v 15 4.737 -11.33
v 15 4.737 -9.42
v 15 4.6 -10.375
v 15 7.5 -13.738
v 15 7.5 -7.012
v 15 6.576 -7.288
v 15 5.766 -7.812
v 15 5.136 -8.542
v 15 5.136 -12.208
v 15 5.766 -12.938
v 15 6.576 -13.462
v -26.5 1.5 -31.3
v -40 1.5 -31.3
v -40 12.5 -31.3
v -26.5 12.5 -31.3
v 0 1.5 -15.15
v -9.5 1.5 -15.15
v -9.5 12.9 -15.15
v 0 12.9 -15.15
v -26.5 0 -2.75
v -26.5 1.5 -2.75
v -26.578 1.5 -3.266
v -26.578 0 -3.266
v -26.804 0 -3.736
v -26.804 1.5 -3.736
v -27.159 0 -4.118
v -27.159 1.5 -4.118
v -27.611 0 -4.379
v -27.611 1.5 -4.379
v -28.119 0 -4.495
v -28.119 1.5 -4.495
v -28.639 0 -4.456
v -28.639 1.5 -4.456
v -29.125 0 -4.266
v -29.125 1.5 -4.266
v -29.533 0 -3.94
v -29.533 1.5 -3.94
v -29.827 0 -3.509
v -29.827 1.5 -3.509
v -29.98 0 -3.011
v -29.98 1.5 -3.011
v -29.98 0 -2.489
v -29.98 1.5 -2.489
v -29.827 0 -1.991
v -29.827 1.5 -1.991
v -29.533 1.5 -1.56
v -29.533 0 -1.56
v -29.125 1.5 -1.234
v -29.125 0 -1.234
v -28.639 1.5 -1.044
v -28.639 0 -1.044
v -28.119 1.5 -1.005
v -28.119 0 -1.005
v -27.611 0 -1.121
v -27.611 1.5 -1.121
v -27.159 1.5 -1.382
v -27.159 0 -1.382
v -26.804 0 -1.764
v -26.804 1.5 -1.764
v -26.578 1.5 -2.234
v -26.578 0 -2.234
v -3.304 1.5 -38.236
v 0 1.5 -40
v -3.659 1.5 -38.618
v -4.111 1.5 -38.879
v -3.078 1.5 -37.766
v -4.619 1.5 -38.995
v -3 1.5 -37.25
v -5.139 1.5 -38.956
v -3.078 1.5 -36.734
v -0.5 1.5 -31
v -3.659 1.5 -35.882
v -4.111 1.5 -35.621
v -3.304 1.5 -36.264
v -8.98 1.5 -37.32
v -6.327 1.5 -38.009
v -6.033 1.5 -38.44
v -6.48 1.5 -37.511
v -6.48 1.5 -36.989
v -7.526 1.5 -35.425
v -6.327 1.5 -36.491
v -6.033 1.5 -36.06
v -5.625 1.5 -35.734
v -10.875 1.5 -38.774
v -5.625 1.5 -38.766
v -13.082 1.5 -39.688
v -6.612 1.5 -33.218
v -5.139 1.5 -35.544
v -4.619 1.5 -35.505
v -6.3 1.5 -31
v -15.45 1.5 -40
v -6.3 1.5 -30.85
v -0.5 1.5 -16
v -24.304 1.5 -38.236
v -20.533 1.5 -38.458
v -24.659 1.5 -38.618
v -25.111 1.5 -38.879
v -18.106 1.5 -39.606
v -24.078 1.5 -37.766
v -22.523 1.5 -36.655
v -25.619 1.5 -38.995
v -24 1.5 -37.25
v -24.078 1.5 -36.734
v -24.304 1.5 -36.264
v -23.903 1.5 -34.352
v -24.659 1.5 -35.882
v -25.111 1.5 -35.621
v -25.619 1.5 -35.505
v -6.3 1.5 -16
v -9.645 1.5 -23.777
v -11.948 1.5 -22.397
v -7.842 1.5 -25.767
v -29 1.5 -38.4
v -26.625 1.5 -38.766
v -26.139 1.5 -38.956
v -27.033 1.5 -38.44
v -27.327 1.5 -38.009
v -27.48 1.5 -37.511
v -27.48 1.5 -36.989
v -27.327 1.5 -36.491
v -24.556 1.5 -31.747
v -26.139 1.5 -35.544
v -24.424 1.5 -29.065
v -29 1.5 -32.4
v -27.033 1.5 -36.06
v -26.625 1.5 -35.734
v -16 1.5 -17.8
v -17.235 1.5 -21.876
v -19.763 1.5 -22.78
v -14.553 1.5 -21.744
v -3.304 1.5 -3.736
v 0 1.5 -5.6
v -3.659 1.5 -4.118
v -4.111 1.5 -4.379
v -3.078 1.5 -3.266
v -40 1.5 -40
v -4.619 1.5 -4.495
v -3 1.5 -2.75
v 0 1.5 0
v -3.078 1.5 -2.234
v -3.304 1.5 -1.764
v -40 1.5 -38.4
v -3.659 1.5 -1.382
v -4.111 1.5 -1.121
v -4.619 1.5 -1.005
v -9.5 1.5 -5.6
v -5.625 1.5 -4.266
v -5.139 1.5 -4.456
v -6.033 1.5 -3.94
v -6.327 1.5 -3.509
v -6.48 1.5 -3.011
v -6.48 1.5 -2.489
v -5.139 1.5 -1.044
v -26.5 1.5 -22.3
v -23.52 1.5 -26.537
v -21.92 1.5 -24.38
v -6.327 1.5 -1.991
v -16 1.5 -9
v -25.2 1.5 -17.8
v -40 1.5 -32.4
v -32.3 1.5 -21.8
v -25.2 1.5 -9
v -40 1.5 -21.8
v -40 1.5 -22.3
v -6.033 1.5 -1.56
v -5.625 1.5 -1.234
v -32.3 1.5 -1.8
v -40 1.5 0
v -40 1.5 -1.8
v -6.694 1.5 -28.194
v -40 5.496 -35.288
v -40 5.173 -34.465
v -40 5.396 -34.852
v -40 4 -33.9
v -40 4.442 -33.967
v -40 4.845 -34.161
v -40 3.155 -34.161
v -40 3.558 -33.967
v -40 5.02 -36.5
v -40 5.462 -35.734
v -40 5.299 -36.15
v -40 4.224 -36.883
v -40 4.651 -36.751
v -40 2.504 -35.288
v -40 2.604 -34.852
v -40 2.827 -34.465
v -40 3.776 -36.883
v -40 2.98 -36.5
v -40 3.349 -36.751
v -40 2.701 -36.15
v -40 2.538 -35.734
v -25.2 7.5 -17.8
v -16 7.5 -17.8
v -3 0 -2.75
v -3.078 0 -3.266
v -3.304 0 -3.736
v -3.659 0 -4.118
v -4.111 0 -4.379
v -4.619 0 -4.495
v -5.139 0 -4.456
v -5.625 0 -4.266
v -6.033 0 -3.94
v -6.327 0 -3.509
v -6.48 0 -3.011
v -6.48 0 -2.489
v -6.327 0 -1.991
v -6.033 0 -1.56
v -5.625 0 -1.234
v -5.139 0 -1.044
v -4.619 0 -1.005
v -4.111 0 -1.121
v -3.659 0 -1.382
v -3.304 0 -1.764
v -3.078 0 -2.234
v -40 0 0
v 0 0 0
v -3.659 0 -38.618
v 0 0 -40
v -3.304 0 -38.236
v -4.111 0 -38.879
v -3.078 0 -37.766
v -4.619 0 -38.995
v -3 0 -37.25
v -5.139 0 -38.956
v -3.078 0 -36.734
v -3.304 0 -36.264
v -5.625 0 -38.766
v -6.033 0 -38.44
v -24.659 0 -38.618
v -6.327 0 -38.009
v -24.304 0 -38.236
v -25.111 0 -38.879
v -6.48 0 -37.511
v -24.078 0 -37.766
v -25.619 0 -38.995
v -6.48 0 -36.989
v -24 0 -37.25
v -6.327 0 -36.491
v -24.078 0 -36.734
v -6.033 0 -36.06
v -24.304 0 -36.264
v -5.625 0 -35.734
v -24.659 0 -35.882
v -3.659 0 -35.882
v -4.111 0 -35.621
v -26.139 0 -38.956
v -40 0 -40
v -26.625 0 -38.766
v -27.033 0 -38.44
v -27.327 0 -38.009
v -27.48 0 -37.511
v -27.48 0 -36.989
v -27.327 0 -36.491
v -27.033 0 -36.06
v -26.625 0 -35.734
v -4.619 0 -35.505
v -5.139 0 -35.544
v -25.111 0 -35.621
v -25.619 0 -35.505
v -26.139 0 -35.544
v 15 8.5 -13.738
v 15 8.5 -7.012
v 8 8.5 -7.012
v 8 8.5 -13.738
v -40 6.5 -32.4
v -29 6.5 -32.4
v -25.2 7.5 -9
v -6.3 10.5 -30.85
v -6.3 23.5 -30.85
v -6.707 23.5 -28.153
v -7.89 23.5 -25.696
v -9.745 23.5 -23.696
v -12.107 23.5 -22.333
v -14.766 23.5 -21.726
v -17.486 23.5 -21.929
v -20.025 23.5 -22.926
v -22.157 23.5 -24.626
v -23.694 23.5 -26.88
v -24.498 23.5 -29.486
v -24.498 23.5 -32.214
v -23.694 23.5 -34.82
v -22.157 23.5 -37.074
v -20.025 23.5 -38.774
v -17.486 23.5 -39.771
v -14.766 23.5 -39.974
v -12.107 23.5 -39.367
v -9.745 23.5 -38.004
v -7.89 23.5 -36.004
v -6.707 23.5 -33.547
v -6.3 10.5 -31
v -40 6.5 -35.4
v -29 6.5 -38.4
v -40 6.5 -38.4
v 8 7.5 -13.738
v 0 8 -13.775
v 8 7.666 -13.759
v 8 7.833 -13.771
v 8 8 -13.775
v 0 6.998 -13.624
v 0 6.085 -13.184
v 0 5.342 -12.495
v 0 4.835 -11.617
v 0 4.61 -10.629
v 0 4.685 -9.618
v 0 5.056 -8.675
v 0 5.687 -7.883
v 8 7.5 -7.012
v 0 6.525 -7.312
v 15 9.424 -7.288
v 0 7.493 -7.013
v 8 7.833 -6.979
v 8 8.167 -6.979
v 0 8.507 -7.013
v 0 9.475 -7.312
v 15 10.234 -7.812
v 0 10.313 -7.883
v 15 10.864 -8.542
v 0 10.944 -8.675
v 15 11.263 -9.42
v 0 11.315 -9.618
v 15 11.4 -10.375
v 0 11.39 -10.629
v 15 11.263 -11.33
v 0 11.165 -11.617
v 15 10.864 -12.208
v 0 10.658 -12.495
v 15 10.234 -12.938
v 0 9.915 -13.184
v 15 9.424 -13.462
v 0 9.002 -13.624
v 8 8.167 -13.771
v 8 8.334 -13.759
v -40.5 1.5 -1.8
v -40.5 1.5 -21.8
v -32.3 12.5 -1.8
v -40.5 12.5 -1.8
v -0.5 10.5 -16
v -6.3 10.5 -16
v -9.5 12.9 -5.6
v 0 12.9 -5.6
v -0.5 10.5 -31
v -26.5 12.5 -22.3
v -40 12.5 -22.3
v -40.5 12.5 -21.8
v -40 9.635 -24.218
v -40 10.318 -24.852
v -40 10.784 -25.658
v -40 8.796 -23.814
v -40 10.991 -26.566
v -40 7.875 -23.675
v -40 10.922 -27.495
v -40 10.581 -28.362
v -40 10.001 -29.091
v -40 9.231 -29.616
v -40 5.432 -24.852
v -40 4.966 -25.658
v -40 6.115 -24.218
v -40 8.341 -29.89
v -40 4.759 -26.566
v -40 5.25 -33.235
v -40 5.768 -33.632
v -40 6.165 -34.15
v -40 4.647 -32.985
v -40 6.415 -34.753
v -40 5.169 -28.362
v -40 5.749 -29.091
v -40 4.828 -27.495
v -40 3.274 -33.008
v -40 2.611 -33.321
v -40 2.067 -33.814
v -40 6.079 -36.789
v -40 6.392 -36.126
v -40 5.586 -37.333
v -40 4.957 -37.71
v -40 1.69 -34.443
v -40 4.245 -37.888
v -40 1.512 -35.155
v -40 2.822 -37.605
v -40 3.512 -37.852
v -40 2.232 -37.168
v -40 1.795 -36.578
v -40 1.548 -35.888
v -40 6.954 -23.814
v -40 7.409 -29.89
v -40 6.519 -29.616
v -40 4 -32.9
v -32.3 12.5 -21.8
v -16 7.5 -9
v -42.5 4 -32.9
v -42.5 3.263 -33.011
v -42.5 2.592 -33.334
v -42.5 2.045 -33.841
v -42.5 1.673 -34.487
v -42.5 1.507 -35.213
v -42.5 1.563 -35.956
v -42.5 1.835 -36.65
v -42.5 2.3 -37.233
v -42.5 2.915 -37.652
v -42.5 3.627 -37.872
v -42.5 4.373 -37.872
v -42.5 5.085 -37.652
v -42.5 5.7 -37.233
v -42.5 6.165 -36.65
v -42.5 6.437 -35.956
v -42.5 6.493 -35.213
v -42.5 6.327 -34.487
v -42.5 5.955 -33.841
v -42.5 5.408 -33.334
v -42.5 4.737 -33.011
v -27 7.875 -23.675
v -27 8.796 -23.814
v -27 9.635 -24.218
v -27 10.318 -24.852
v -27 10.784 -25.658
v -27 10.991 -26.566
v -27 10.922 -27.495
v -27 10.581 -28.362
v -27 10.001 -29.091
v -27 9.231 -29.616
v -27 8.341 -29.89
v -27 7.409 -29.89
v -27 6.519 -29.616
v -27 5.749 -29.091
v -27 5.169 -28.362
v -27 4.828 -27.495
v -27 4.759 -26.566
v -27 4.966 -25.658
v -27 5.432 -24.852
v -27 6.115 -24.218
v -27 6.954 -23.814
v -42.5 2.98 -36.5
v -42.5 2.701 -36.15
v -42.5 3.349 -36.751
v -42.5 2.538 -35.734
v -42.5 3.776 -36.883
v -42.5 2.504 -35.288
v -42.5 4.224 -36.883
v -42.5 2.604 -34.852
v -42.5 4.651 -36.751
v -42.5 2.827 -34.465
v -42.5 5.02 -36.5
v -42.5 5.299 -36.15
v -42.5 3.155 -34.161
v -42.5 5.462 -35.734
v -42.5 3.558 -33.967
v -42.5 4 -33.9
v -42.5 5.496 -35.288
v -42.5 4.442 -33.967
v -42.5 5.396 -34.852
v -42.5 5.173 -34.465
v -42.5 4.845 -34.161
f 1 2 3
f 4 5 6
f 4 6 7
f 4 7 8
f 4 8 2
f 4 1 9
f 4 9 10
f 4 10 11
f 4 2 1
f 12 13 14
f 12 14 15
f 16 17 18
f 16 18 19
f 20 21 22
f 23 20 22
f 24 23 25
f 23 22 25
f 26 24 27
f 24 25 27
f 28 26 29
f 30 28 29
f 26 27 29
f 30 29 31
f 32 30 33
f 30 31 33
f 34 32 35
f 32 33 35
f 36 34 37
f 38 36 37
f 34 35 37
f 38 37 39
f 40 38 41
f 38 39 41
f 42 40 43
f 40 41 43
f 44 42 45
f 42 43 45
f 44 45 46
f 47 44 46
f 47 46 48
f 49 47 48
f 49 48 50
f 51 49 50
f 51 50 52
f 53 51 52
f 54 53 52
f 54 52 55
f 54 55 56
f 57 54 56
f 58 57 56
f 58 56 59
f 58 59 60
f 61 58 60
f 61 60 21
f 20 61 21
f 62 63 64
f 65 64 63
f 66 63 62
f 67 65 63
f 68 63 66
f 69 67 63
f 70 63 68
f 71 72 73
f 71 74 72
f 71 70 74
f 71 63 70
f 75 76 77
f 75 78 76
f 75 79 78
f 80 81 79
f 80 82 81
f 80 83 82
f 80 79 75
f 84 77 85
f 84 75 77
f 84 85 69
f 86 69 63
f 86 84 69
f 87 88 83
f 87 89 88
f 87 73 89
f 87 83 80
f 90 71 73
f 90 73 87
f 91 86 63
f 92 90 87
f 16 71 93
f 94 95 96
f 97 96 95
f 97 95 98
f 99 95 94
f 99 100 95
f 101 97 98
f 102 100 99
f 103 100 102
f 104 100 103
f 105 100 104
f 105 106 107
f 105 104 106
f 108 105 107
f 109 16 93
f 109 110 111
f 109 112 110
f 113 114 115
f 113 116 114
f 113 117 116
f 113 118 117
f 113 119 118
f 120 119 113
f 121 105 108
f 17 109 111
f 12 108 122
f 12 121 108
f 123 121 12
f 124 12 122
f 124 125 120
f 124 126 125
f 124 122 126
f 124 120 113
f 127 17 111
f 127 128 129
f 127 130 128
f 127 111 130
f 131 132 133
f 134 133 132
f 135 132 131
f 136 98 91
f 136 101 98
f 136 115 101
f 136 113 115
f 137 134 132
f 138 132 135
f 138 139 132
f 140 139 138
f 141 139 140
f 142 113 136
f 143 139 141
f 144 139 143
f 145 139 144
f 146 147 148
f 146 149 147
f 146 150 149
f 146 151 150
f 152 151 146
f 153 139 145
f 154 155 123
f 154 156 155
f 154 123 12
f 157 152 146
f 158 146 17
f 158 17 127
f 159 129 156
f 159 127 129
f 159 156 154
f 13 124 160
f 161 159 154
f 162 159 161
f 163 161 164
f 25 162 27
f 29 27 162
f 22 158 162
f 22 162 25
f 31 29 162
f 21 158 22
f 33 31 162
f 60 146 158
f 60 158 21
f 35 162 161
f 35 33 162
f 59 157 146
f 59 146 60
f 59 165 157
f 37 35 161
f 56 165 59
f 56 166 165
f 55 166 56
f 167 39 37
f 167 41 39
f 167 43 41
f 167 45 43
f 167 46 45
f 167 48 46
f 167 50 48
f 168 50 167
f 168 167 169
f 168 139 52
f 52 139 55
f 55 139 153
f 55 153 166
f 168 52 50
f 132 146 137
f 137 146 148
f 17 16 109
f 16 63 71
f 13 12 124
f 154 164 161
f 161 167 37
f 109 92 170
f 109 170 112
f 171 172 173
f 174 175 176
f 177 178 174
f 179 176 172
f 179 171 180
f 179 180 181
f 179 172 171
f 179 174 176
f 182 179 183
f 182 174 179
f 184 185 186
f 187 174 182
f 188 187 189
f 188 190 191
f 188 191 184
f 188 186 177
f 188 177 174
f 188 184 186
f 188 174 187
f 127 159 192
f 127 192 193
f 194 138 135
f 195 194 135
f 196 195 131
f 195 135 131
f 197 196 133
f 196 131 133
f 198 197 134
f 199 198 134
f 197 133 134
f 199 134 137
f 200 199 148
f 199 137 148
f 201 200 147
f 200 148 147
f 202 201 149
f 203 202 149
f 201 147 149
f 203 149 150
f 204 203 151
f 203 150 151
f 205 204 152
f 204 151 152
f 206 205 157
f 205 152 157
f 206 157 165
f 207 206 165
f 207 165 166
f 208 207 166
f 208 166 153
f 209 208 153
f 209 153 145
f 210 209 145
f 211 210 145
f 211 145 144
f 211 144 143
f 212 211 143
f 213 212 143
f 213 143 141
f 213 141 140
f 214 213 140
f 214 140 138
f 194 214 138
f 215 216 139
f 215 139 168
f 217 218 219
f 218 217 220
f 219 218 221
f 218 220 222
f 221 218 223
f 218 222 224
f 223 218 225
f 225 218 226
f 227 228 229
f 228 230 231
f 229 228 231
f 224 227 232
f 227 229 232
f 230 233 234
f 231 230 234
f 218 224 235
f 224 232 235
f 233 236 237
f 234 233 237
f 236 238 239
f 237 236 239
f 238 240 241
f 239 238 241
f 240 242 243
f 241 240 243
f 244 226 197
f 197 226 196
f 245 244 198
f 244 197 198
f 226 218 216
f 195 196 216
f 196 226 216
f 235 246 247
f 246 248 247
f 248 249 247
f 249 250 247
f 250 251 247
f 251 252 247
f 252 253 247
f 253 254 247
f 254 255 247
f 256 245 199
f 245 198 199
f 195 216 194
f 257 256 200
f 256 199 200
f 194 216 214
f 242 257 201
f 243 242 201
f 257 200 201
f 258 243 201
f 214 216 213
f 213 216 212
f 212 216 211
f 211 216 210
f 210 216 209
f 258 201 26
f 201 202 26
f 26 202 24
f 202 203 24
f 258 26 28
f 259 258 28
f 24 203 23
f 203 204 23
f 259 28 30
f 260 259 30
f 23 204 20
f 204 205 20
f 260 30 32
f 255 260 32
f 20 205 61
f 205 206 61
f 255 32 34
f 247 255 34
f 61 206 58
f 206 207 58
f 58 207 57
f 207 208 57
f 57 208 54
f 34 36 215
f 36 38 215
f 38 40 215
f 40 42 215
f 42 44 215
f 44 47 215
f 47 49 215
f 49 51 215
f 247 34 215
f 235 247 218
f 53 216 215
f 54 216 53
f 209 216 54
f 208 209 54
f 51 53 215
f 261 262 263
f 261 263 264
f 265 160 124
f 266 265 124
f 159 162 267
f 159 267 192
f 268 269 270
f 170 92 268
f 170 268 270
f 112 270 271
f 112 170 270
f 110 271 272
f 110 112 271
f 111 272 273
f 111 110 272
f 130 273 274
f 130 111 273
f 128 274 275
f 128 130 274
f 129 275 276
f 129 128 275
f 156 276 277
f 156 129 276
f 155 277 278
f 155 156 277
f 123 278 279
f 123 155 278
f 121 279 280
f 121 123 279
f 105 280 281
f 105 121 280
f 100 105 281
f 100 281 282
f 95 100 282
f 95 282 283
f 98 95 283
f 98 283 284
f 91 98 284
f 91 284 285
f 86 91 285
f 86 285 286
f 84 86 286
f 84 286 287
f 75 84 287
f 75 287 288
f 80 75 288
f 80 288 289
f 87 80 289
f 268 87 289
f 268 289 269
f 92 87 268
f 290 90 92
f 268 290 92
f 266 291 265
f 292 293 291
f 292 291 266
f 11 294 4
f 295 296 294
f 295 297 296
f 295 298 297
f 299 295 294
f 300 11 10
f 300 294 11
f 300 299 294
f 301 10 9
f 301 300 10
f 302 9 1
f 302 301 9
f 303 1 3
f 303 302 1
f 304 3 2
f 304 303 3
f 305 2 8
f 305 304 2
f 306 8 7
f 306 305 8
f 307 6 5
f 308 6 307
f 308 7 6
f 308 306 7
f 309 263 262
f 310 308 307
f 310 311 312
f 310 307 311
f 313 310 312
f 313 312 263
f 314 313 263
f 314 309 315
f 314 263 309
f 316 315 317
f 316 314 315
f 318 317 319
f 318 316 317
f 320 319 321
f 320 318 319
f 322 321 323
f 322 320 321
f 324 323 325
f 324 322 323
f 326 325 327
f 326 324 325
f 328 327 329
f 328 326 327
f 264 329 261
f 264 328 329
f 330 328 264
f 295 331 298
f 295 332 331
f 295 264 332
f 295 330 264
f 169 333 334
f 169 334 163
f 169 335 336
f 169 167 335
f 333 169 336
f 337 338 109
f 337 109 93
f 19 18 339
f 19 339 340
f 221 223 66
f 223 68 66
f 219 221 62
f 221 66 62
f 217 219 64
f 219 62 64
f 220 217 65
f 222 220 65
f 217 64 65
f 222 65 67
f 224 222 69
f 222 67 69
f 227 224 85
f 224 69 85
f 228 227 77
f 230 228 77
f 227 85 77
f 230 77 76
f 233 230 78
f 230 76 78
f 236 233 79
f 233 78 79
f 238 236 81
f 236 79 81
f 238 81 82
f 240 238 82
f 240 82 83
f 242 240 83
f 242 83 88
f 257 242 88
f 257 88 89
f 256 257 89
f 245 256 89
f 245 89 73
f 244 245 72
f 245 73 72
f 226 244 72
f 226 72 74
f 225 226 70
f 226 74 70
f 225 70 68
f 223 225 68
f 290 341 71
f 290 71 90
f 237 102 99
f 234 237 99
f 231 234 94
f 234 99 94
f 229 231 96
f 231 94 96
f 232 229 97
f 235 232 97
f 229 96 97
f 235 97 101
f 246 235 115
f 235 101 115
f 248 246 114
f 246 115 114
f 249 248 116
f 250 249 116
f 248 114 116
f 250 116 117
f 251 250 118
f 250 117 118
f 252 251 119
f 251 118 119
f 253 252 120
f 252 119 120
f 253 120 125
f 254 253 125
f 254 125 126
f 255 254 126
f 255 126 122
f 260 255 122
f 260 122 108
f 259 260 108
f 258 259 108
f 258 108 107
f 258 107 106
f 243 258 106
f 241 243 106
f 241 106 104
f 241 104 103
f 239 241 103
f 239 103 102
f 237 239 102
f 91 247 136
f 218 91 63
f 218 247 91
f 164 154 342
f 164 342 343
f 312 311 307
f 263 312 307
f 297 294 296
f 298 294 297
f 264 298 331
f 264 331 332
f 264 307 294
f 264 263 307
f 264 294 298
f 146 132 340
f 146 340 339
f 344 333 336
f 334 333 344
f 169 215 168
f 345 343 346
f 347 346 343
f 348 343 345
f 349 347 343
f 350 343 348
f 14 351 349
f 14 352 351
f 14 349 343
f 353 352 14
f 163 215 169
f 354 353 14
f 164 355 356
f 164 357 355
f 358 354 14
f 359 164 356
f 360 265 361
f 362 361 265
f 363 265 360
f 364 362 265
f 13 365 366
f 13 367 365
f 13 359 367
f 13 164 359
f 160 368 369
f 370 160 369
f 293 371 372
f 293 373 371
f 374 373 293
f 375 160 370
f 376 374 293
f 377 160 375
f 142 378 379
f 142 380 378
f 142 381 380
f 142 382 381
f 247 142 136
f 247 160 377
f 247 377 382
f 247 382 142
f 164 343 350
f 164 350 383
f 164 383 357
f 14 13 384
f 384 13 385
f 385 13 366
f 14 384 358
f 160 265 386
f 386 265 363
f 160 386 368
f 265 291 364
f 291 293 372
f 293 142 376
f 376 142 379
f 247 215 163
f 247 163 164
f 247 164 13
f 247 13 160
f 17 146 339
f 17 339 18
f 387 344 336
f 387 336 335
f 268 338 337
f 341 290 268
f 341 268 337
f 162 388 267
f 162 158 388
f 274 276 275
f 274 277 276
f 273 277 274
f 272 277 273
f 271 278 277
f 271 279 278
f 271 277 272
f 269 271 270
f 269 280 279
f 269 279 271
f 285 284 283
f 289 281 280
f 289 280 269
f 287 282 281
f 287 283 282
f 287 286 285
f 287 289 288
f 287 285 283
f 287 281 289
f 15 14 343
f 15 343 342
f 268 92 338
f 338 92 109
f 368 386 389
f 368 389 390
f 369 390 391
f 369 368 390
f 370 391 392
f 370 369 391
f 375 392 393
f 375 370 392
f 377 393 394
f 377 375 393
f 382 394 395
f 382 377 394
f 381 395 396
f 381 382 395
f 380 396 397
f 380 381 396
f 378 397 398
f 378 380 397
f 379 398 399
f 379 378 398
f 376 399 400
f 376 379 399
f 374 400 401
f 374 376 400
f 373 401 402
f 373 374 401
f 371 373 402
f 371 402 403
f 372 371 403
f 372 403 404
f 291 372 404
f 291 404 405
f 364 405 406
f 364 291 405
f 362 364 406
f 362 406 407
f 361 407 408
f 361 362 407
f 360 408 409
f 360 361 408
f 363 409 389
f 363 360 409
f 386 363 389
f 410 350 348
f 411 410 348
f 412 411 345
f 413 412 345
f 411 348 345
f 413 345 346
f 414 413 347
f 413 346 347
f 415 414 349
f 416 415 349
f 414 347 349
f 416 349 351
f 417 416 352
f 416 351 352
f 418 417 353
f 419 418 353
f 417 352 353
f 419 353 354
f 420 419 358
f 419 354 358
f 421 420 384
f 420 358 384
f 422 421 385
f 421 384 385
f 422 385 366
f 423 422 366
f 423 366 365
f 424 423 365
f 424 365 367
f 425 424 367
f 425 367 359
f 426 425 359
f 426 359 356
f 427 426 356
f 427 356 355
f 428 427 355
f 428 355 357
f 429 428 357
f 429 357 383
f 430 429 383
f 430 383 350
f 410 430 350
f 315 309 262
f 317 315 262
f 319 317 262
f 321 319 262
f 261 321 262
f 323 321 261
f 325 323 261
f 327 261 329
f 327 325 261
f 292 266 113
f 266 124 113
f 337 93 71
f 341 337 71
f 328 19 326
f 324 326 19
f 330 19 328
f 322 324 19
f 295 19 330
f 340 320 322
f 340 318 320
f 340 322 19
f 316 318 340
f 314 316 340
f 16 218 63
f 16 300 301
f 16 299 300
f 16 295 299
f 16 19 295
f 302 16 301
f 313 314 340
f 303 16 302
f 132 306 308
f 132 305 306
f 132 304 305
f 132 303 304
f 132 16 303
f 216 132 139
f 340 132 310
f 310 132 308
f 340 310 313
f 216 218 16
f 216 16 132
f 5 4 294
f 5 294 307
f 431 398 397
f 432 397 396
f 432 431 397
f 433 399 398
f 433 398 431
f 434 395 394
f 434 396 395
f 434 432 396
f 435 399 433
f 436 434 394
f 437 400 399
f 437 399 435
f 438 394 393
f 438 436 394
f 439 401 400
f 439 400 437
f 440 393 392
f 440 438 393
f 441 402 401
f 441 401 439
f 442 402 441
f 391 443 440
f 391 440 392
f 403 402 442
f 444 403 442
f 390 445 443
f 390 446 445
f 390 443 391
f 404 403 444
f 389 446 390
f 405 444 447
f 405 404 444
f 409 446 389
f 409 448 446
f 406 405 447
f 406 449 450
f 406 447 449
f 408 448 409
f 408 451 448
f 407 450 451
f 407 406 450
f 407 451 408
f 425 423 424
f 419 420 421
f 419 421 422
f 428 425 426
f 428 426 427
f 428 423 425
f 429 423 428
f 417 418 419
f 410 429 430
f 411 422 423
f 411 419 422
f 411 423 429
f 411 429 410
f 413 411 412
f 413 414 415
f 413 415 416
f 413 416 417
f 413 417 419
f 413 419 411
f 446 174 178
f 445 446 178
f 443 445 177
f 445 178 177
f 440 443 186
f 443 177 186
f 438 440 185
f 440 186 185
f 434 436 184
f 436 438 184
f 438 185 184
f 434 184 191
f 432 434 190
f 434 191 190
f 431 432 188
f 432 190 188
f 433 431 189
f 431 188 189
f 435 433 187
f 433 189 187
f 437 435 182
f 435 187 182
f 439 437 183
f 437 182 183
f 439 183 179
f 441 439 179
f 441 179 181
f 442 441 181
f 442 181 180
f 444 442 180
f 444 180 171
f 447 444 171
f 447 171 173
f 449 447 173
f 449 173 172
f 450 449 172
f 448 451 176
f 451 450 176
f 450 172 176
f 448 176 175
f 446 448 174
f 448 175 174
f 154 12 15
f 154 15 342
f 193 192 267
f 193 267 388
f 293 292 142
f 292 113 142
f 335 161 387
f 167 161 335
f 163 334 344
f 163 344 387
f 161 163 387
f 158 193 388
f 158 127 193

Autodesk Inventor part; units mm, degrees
ref_plane "YZ Plane" through (0, 0, 0) normal (1, 0, 0) x (0, 1, 0)
ref_plane "XZ Plane" through (0, 0, 0) normal (0, 1, 0) x (-1, 0, 0)
ref_plane "XY Plane" through (0, 0, 0) normal (0, 0, 1) x (1, 0, 0)
sketch "Sketch1" plane through (0, 0, 0) normal (0, 1, 0) x (-1, 0, 0)
  line L0 (0, 0) -> (40, 0)
  line L1 (40, 0) -> (40, -40)
  line L2 (40, -40) -> (0, -40)
  line L3 (0, -40) -> (0, 0)
  dimension "d0" = 40
  dimension "d1" = 40
extrude "Extrusion1" add sketch "Sketch1" along normal blind 1.5
sketch "Sketch2" plane through (0, 1.5, 0) normal (0, 1, 0) x (1, 0, 0)
  circle A0 centre (-4.75, 37.25) radius 1.75
  circle A1 centre (-25.75, 37.25) radius 1.75
  circle A2 centre (-28.25, 2.75) radius 1.75
  circle A3 centre (-4.75, 2.75) radius 1.75
  circle A4 centre (-15.45, 30.85) radius 9.15
  line L0 (-40, 32.4) -> (-29, 32.4)
  line L1 (-29, 32.4) -> (-29, 38.4)
  line L2 (-29, 38.4) -> (-40, 38.4)
  line L3 (-40, 38.4) -> (-40, 32.4)
  line L4 (-40.5, 31.3) -> (-26.5, 31.3)
  line L5 (-26.5, 31.3) -> (-26.5, 22.3)
  line L6 (-26.5, 22.3) -> (-40.5, 22.3)
  line L7 (-40.5, 22.3) -> (-40.5, 31.3)
  line L8 (-40.5, 21.8) -> (-32.3, 21.8)
  line L9 (-32.3, 21.8) -> (-32.3, 1.8)
  line L10 (-32.3, 1.8) -> (-40.5, 1.8)
  line L11 (-40.5, 1.8) -> (-40.5, 21.8)
  line L12 (-9.5, 15.15) -> (0, 15.15)
  line L13 (0, 15.15) -> (0, 5.6)
  line L14 (0, 5.6) -> (-9.5, 5.6)
  line L15 (-9.5, 5.6) -> (-9.5, 15.15)
  line L16 (-6.3, 31) -> (-0.5, 31)
  line L17 (-0.5, 31) -> (-0.5, 16)
  line L18 (-0.5, 16) -> (-6.3, 16)
  line L19 (-6.3, 16) -> (-6.3, 31)
  line L20 (-25.2, 17.8) -> (-16, 17.8)
  line L21 (-16, 17.8) -> (-16, 9)
  line L22 (-16, 9) -> (-25.2, 9)
  line L23 (-25.2, 9) -> (-25.2, 17.8)
  line L24 (-40, 0) -> (0, 0) projected
  line L25 (0, 40) -> (-40, 40) projected
  line L26 (-40, 40) -> (-40, 0) projected
  line L27 (-40, 0) -> (0, 0) projected
  line L28 (0, 0) -> (0, 40) projected
  line L29 (0, 40) -> (-40, 40) projected
  point P0 (-36.4, 1.8)
  point P1 (-40, 31.3)
  point P2 (-40, 22.3)
  dimension "d4" = 3.5
  dimension "d5" = 3.5
  dimension "d6" = 3.5
  dimension "d7" = 3.5
  dimension "d8" = 18.3
  dimension "d9" = 8.2
  dimension "d10" = 20
  dimension "d11" = 8.8
  dimension "d12" = 9.2
  dimension "d13" = 9.55
  dimension "d14" = 9.5
  dimension "d15" = 15
  dimension "d16" = 5.8
  dimension "d17" = 11
  dimension "d18" = 6
  dimension "d21" = 9
  dimension "d22" = 14
  dimension "d23" = 5.6
  dimension "d24" = 4.75
  dimension "d25" = 2.75
  dimension "d26" = 0.5
  dimension "d27" = 9
  dimension "d28" = 9
  dimension "d29" = 6.5
  dimension "d30" = 9.15
  dimension "d31" = 9.15
  dimension "d32" = 2.75
  dimension "d33" = 0.5
  dimension "d34" = 1.8
  dimension "d35" = 1.6
  dimension "d37" = 0.5
  dimension "d38" = 0.5
  dimension "d39" = 11.75
  dimension "d40" = 2.75
  dimension "d41" = 2.75
  dimension "d42" = 4.75
  dimension "d43" = 14.25
extrude "Extrusion2" add sketch "Sketch2" along normal blind 6 contours L20 L21 L22 L23
extrude "Extrusion3" add sketch "Sketch2" along normal blind 22 contours A4
extrude "Extrusion4" cut sketch "Sketch2" against normal through all contours A0 | A1 | A2 | A3
extrude "Extrusion5" add sketch "Sketch2" along normal blind 11 contours L26 L8 L9 L10 | L10 L11 L8 L26
extrude "Extrusion6" add sketch "Sketch2" along normal blind 11.4 contours L13 L14 L15 L12
sketch "Sketch2 outline for Extrusion7" plane through (0, 1.5, 0) normal (0, 1, 0) x (1, 0, 0)
  line L0 (-6.3, 16) -> (-0.5, 16)
  line L1 (-6.3, 31) -> (-6.3, 16)
  line L2 (-0.5, 31) -> (-6.3, 31)
  line L3 (-0.5, 16) -> (-0.5, 31)
extrude "Extrusion7" add sketch "Sketch2 outline for Extrusion7" along normal blind 9
extrude "Extrusion8" add sketch "Sketch2" along normal blind 11 contours L4 L5 L6 L26
extrude "Extrusion9" add sketch "Sketch2" along normal blind 5 contours L2 L1 L0 L3
sketch "Sketch3" plane through (-40, 0, -40) normal (-1, 0, 0) x (0, 0, 1)
  line L0 (8.7, 12.5) -> (17.7, 12.5) projected
  line L1 (8.7, 1.5) -> (8.7, 12.5) projected
  line L2 (17.7, 1.5) -> (17.7, 12.5) projected
  circle A0 centre (13.2, 7.875) radius 3.125
  point P0 (40, 0)
  dimension "d60" = 6.25
  dimension "d61" = 4.625
extrude "Extrusion10" cut sketch "Sketch3" against normal blind 13
sketch "Sketch4" plane through (-40, 0, -40) normal (-1, 0, 0) x (0, 0, 1)
  line L0 (1.6, 1.5) -> (1.6, 6.5) projected
  line L1 (1.6, 6.5) -> (7.6, 6.5) projected
  line L2 (7.6, 1.5) -> (7.6, 6.5) projected
  circle A0 centre (4.6, 4) radius 2.5
  circle A1 centre (4.6, 4) radius 1.5
  point P0 (40, 0)
  dimension "d64" = 5
  dimension "d65" = 1
  dimension "d66" = 6
  dimension "d67" = 3
extrude "Extrusion11" add sketch "Sketch4" along normal blind 2.5
sketch "Sketch5" plane through (0, 0, 0) normal (1, 0, 0) x (0, 0, -1)
  circle A0 centre (10.375, 8) radius 3.4
  line L0 (15.15, 1.5) -> (15.15, 12.9) projected
  line L1 (5.6, 12.9) -> (15.15, 12.9) projected
  line L2 (5.6, 1.5) -> (5.6, 12.9) projected
  point P0 (0, 0)
  dimension "d70" = 6.8
  dimension "d71" = 4.9
  dimension "d72" = 4.775
  dimension "d73" = 9.55
extrude "Extrusion12" add sketch "Sketch5" along normal blind 15
sketch "Sketch6" plane through (15, 8, -10.375) normal (1, 0, 0) x (0, 0, -1)
  circle A0 centre (0, 0) radius 3.4
  line L0 (-3.363034, 0.5) -> (3.363034, 0.5)
  line L1 (3.363034, 0.5) -> (3.363034, -0.5)
  line L2 (3.363034, -0.5) -> (-3.363034, -0.5)
  line L3 (-3.363034, -0.5) -> (-3.363034, 0.5)
  line L4 (-3.363034, 0.5) -> (3.363034, -0.5) construction
  line L5 (3.363034, 0.5) -> (-3.363034, -0.5) construction
  point P0 (-3.363034, 0.5)
  point P1 (-3.363034, -0.5)
  point P2 (3.363034, 0.5)
  dimension "d76" = 1
extrude "Extrusion13" cut sketch "Sketch6" against normal blind 7 contours A0 L1 | L1 L2 L3 L0 | L3 A0
equation "\"d5\" = d4"
equation "\"d6\" = d5"
equation "\"d7\" = d4"
equation "\"d30\" = 0.5 * d8"
equation "\"d31\" = 0.5 * d8"
properties part number "amp"
